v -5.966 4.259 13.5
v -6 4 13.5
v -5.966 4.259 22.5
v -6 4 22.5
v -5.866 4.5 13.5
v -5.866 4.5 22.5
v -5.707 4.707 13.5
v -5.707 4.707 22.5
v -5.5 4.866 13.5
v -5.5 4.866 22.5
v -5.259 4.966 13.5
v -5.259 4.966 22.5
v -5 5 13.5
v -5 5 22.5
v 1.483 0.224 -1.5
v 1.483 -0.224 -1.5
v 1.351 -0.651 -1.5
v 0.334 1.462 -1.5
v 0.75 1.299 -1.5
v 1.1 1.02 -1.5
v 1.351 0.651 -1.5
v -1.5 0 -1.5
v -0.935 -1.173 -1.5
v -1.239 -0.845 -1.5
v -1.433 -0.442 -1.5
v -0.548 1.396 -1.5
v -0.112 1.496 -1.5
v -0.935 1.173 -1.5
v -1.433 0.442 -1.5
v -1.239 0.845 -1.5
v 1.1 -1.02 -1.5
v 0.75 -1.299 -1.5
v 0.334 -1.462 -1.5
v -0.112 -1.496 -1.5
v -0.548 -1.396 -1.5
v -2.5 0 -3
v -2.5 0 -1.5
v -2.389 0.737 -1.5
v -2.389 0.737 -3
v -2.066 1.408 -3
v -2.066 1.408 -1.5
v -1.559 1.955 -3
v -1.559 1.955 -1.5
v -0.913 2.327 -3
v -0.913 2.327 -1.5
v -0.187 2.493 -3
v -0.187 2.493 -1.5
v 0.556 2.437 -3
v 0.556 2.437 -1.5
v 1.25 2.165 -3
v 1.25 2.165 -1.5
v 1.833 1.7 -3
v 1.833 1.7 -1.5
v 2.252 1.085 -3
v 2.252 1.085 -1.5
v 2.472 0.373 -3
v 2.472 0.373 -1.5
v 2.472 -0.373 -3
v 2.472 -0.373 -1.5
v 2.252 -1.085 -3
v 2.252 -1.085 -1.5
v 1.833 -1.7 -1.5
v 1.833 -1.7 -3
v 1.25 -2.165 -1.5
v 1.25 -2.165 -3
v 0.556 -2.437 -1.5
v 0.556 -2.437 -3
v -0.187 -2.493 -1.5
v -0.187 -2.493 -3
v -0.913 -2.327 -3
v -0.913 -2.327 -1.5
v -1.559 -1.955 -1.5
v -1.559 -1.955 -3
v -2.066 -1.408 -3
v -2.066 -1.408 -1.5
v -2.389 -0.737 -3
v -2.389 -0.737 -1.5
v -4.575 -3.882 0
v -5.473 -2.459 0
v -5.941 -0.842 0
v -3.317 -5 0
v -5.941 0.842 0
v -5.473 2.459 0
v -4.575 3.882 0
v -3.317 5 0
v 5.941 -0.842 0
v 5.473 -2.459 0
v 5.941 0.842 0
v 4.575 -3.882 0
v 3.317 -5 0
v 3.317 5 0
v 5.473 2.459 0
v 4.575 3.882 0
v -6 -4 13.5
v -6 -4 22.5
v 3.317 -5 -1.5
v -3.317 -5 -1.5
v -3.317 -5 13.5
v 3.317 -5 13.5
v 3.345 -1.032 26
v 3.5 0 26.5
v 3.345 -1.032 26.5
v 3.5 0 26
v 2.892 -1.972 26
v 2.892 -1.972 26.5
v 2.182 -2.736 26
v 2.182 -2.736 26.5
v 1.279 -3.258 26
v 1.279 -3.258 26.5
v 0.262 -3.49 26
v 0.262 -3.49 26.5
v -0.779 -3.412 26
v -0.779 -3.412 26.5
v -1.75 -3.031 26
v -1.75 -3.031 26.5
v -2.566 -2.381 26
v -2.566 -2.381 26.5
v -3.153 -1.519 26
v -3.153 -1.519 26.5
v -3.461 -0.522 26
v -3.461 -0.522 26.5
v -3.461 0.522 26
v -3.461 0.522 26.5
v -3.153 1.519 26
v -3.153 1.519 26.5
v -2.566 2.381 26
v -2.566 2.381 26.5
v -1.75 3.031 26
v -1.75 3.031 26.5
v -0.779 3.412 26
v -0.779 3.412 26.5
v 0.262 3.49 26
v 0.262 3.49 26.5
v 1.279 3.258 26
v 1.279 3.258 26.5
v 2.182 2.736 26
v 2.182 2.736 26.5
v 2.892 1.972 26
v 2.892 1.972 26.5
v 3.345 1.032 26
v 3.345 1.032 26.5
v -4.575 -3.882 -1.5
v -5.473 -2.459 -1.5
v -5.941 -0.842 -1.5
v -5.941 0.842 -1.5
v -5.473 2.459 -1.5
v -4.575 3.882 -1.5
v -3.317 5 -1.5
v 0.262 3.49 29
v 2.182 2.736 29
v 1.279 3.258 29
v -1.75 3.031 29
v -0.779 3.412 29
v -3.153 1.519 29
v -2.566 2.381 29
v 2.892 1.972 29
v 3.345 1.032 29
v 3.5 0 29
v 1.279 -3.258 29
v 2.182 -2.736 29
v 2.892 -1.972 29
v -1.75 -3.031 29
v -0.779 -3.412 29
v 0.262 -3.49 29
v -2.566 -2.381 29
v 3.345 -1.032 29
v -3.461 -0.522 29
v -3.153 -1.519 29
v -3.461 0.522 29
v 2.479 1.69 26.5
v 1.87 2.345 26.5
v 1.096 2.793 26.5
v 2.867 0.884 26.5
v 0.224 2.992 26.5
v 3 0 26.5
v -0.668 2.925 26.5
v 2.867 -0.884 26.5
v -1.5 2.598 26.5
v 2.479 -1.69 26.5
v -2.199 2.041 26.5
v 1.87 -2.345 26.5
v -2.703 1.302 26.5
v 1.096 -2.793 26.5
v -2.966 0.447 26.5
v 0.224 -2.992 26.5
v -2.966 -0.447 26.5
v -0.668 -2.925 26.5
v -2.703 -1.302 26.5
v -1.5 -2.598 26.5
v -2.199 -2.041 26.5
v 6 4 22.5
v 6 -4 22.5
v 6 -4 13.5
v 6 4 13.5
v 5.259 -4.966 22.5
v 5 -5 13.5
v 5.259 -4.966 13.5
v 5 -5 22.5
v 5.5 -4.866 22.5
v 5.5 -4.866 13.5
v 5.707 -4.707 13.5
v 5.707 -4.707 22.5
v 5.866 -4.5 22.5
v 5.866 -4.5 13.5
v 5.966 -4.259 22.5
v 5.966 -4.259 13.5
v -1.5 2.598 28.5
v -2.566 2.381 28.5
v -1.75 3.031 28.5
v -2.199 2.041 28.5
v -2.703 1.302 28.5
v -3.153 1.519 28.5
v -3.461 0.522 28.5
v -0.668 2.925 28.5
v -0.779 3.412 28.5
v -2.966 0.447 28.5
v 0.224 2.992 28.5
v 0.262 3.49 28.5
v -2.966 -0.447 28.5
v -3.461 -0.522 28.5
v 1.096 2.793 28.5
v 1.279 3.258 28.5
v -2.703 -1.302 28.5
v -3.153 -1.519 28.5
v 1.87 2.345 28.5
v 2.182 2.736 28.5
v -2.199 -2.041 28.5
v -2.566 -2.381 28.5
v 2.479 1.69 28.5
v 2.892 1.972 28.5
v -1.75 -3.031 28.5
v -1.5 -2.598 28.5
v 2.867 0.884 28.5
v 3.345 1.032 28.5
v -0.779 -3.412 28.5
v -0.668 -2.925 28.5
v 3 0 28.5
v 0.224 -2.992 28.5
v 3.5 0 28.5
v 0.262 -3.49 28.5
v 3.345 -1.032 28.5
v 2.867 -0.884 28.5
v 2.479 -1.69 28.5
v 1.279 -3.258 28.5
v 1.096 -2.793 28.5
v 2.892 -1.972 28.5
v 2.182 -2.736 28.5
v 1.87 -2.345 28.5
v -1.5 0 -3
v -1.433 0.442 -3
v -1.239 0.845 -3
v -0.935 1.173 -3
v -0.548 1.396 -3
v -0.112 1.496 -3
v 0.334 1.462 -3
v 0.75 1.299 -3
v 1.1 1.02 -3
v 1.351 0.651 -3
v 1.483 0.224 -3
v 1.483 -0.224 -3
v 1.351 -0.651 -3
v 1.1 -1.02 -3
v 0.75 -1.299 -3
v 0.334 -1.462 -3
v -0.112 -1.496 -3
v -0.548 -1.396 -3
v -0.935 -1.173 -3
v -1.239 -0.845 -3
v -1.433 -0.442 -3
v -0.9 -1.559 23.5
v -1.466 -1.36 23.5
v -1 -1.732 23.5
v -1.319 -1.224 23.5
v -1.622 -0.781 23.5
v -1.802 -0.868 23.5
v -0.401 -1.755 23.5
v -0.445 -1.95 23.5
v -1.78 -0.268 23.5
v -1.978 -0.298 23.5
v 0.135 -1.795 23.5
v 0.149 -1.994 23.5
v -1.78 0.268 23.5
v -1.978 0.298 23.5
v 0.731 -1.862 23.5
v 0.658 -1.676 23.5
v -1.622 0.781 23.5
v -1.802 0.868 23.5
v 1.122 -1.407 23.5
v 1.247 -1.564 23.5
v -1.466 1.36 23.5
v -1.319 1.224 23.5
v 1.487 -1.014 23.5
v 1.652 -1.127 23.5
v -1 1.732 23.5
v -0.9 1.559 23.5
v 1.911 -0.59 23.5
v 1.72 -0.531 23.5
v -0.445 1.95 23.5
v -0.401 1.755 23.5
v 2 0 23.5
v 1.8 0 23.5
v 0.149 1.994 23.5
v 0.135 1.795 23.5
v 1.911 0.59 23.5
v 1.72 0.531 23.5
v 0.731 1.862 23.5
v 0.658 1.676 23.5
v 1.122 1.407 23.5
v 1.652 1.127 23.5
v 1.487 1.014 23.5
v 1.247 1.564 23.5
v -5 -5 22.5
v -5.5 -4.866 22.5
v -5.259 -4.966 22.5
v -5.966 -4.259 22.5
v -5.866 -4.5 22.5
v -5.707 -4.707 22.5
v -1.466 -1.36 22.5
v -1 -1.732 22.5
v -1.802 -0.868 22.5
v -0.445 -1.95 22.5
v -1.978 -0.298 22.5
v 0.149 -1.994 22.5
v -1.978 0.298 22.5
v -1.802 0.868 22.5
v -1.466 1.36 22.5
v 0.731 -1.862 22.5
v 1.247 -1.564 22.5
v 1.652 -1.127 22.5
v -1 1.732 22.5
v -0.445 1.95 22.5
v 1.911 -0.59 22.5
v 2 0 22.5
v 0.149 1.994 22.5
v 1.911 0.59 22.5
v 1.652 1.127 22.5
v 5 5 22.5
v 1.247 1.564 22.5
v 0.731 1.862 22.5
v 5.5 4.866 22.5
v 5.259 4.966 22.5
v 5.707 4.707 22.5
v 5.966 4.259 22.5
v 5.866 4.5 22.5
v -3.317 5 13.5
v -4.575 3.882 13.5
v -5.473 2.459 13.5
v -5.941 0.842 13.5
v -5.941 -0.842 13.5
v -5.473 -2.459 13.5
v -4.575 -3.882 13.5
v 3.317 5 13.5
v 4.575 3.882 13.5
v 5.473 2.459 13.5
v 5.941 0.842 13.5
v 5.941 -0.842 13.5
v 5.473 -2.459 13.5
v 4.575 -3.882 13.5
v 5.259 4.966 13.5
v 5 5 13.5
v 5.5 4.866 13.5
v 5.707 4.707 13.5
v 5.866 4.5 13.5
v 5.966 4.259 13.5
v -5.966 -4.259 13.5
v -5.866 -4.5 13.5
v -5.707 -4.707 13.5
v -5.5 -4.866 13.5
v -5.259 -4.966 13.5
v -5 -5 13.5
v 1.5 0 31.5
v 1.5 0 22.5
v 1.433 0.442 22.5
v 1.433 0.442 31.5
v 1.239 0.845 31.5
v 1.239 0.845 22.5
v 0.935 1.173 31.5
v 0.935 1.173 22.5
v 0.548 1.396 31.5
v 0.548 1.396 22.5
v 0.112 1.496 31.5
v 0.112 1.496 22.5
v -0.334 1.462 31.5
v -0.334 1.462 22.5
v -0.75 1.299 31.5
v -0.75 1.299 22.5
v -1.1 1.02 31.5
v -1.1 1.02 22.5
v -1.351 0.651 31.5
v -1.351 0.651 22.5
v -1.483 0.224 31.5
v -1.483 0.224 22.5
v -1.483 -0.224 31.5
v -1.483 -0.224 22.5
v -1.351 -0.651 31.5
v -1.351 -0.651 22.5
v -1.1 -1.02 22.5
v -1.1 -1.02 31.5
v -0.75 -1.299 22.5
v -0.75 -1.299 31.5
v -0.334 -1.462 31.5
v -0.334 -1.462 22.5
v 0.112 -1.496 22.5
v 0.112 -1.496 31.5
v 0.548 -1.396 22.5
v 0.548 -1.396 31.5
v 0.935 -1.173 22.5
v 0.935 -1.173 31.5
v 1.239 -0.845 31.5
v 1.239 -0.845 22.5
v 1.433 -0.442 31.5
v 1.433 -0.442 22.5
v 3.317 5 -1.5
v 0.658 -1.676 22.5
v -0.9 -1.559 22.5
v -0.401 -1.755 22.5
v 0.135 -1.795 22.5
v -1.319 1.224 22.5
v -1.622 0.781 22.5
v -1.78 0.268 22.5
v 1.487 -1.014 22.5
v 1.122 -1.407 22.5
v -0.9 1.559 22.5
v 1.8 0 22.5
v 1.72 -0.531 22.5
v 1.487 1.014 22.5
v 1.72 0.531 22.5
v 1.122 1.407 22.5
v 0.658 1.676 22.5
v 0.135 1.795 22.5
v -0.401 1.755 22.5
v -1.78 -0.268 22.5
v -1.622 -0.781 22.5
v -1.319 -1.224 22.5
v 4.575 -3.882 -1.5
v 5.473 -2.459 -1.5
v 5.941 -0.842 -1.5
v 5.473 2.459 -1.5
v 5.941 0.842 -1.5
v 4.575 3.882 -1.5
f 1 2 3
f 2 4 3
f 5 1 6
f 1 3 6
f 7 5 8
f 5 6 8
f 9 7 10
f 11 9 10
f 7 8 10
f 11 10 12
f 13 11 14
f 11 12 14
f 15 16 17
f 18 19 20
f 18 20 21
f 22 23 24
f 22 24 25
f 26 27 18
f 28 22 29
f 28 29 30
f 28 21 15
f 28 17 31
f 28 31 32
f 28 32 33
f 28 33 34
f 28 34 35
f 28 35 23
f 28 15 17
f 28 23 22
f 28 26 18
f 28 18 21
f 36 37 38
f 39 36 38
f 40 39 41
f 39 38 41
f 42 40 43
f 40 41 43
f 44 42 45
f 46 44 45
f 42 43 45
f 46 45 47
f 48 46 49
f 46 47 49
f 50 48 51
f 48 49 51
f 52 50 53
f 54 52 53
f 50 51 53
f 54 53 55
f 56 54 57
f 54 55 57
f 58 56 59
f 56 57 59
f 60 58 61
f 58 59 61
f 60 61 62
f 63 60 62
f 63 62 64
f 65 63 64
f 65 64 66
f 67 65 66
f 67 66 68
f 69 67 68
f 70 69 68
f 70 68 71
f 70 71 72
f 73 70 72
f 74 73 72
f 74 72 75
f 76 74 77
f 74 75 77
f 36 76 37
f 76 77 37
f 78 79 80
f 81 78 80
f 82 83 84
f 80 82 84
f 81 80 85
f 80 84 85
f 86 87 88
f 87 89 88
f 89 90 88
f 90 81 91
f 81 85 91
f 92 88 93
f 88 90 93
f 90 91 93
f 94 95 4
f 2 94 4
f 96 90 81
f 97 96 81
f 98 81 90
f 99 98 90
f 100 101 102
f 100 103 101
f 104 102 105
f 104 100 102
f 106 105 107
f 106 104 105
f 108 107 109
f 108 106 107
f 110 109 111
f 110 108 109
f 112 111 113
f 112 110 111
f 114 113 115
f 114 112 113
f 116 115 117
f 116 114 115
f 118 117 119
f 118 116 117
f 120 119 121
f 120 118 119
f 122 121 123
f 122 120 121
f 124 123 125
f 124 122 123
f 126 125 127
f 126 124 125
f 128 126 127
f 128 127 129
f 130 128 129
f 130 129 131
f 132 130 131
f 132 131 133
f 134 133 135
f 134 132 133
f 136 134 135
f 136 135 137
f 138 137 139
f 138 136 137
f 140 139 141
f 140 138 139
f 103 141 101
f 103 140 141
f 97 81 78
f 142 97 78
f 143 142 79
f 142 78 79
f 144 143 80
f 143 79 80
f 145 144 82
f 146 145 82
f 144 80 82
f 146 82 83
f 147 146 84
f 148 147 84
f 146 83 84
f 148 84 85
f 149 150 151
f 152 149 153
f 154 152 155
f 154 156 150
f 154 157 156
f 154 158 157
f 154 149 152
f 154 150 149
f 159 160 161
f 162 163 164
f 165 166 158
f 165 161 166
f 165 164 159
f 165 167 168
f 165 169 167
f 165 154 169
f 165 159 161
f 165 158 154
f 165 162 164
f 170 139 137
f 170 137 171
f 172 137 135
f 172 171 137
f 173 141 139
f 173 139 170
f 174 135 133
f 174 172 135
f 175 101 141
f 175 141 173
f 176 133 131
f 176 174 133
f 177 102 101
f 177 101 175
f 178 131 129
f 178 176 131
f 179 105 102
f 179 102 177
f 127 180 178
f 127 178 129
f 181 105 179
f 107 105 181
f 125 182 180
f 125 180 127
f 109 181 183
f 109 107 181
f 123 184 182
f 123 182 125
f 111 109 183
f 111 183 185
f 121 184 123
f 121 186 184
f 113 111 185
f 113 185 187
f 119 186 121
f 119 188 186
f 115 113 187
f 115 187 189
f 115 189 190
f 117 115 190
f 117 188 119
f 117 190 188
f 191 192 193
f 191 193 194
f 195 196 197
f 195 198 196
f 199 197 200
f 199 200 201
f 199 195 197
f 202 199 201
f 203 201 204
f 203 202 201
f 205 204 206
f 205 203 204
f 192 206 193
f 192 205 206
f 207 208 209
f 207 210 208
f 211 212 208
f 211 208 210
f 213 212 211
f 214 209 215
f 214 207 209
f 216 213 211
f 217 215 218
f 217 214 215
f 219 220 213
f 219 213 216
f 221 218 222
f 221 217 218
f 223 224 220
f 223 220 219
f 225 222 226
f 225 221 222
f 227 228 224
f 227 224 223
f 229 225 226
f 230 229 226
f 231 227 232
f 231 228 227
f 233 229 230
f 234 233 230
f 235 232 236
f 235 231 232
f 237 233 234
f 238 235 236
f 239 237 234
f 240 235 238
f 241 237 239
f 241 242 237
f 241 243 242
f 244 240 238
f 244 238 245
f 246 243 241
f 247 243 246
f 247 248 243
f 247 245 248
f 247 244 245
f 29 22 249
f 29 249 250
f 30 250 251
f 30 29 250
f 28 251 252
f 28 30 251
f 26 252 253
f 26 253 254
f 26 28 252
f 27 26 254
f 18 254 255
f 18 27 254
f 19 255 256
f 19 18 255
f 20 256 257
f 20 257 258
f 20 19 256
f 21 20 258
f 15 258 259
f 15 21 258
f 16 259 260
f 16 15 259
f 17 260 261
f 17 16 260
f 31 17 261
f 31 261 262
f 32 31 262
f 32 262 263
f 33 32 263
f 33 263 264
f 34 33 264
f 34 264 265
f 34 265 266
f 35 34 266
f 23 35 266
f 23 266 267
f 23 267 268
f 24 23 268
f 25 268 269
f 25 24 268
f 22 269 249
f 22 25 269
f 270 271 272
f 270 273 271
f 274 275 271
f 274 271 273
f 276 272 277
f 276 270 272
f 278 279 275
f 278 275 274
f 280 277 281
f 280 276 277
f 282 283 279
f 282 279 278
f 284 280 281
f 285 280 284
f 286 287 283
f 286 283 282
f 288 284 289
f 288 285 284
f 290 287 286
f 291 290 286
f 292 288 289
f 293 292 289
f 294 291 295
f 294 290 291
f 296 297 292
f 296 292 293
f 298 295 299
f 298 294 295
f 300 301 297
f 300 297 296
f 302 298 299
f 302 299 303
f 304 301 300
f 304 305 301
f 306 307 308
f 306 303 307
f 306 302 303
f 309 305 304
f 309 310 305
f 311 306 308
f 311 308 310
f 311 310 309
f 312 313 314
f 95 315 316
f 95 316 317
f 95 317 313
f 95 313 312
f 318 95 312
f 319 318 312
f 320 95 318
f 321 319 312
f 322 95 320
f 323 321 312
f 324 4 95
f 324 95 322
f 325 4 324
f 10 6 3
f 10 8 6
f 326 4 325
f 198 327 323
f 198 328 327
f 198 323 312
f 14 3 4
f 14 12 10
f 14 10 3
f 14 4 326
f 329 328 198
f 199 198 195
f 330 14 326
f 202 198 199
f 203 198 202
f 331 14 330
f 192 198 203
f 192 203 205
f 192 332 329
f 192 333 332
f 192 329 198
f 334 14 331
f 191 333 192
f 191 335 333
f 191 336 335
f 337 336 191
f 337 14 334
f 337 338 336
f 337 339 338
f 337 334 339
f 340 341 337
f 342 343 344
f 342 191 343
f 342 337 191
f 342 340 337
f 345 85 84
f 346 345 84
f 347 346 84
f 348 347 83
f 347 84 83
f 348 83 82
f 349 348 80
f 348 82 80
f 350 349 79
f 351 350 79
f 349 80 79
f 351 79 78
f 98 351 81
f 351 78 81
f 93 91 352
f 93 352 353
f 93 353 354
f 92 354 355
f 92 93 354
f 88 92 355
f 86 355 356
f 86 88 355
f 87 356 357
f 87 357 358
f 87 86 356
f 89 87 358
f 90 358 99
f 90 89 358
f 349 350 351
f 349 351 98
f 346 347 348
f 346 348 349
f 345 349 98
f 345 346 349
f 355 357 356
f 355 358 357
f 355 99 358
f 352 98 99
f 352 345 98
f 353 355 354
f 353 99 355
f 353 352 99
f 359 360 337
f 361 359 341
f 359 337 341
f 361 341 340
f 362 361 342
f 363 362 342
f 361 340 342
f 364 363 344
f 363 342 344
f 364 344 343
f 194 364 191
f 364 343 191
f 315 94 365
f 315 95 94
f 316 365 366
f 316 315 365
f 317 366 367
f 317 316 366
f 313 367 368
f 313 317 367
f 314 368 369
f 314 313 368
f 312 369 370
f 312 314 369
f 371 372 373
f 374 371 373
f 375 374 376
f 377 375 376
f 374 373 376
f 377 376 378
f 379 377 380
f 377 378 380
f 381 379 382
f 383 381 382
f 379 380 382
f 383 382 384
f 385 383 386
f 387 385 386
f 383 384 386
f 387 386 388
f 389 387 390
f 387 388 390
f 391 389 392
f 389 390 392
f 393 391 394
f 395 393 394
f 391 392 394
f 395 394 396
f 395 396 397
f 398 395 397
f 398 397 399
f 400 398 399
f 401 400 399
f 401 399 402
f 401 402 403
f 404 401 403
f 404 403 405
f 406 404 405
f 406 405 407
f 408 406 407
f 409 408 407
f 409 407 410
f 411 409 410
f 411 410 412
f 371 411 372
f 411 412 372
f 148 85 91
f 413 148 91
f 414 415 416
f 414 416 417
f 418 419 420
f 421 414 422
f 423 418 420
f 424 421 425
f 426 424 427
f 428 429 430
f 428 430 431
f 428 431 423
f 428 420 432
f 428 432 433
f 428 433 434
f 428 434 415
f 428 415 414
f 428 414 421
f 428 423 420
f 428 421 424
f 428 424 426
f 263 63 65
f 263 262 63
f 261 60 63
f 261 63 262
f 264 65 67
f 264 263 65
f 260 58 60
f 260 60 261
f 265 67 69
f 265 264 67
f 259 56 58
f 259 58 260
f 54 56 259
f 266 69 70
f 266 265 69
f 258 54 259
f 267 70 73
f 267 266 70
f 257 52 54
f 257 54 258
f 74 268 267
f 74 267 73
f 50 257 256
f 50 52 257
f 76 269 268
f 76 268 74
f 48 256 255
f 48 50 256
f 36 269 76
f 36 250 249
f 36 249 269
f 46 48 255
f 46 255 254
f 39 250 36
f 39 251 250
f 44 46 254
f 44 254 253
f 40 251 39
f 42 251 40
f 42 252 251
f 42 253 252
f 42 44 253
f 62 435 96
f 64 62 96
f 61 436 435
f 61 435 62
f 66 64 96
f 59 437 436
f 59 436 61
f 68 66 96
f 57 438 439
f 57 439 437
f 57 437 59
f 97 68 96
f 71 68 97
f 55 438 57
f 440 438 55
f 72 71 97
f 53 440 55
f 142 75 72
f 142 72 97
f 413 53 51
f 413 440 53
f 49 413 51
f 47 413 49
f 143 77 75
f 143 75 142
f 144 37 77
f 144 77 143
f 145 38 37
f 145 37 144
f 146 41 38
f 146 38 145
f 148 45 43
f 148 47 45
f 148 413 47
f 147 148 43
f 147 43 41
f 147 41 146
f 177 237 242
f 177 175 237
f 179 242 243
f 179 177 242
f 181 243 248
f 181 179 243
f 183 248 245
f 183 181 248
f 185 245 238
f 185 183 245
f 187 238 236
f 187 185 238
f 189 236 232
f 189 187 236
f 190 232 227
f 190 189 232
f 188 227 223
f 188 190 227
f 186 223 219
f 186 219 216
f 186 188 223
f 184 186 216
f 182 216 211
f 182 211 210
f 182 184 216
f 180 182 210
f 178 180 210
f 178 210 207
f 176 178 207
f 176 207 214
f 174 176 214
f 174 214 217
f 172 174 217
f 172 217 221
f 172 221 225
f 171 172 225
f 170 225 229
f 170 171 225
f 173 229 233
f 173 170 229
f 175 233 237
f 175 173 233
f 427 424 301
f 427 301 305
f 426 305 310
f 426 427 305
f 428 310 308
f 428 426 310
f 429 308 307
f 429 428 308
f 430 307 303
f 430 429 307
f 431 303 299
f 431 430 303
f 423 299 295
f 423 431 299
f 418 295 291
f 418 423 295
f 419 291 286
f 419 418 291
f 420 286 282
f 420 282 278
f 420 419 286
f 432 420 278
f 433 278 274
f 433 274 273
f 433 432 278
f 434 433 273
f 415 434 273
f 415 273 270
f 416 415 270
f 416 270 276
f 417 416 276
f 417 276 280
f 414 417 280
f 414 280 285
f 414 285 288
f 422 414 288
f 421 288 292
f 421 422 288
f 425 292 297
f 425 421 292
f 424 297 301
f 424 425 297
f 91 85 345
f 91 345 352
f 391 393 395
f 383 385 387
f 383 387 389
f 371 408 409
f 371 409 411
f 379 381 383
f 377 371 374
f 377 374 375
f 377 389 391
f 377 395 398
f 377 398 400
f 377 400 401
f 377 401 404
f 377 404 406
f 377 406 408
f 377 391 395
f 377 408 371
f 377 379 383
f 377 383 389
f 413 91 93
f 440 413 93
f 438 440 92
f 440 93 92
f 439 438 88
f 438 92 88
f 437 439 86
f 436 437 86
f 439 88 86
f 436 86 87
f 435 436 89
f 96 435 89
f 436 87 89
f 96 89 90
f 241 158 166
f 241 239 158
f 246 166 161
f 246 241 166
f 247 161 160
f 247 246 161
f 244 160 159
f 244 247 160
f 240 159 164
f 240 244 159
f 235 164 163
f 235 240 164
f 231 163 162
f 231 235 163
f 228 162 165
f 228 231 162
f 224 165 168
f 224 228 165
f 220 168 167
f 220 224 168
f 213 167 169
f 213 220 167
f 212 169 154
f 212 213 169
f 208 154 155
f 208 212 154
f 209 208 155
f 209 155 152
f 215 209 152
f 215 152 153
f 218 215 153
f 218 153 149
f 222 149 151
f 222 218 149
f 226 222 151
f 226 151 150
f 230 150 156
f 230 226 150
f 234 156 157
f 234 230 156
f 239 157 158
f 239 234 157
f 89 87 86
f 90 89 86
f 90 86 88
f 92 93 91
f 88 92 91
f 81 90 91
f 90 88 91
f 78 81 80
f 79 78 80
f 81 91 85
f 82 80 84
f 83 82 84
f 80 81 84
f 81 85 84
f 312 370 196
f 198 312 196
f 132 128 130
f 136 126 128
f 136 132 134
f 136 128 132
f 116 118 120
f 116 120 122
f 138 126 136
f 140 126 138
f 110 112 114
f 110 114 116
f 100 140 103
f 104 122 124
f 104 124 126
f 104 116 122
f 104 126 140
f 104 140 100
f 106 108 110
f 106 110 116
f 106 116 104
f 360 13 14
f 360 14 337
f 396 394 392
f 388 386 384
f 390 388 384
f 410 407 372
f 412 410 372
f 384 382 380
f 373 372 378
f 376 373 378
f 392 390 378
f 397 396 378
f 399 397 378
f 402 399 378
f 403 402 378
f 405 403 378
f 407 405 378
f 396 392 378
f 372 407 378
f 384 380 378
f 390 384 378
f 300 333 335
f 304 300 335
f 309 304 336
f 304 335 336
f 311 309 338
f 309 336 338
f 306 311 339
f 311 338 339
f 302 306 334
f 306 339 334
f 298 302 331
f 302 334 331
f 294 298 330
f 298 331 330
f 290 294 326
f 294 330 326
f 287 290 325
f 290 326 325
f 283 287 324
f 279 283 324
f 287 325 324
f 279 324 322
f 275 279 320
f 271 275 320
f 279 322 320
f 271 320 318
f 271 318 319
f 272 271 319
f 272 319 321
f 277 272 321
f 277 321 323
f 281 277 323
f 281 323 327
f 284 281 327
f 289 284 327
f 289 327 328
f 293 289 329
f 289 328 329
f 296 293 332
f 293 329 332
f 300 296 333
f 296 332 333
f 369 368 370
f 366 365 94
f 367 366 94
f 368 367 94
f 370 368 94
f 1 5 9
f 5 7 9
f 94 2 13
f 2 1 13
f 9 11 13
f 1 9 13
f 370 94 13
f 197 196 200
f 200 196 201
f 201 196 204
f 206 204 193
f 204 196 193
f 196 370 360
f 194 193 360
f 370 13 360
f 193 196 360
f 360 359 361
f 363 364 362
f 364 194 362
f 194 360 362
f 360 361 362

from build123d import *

# Parameters (mm, degrees)
SKETCH1_W           = 6.63324958
SKETCH1_H           = 10
BOSS_EXTRUDE1_DEPTH = 13.5
SKETCH2_W           = 12
SKETCH2_H           = 10
BOSS_EXTRUDE3_DEPTH = 9
SKETCH4_R           = 2
SKETCH4_R_2         = 1.8
BOSS_EXTRUDE4_DEPTH = 1
SKETCH5_R           = 1.5
BOSS_EXTRUDE5_DEPTH = 9
BOSS_EXTRUDE6_DEPTH = 1.5
SKETCH7_R           = 2.5
SKETCH7_R_2         = 1.5
BOSS_EXTRUDE7_DEPTH = 1.5
FILLET1_R           = 1


with BuildPart() as part:
    # Sketch1 → Boss-Extrude1 (new body)
    with BuildSketch(Plane.XY):
        with BuildLine():
            Line((-3.31662479, -5), (-3.31662479, 5))
            ThreePointArc((-3.31662479, 5), (-6, 0), (-3.31662479, -5))
        make_face()
        with BuildLine():
            Line((3.31662479, -5), (3.31662479, 5))
            ThreePointArc((3.31662479, 5), (6, 0), (3.31662479, -5))
        make_face()
        Rectangle(SKETCH1_W, SKETCH1_H)
    extrude(amount=BOSS_EXTRUDE1_DEPTH)


with BuildPart() as body_2:
    # Sketch2 → Boss-Extrude3 (new body)
    with BuildSketch(Plane.XY.offset(13.5)):
        Rectangle(SKETCH2_W, SKETCH2_H)
    extrude(amount=BOSS_EXTRUDE3_DEPTH)

    # Sketch4 → Boss-Extrude4 (add)
    with BuildSketch(Plane.XY.offset(22.5)):
        Circle(SKETCH4_R)
        Circle(SKETCH4_R_2, mode=Mode.SUBTRACT)
    extrude(amount=BOSS_EXTRUDE4_DEPTH)

    # Fillet1
    fillet1_edges = [body_2.edges().sort_by_distance(p)[0] for p in [
        (-6, 5, 18),
        (6, 5, 18),
        (6, -5, 18),
        (-6, -5, 18),
    ]]
    fillet(fillet1_edges, radius=FILLET1_R)


with BuildPart() as body_3:
    # Sketch5 → Boss-Extrude5 (new body)
    with BuildSketch(Plane.XY.offset(22.5)):
        Circle(SKETCH5_R)
    extrude(amount=BOSS_EXTRUDE5_DEPTH)


with BuildPart() as body_4:
    # Sketch6 → Boss-Extrude6 (new body)
    with BuildSketch(Plane(origin=(0, 0, 0), x_dir=(-1, 0, 0), z_dir=(0, 0, -1))):
        with BuildLine():
            Line((3.31662479, 5), (-3.31662479, 5))
            ThreePointArc((-3.31662479, 5), (-6, 0), (-3.31662479, -5))
            Line((-3.31662479, -5), (3.31662479, -5))
            ThreePointArc((3.31662479, -5), (6, 0), (3.31662479, 5))
        make_face()
    extrude(amount=BOSS_EXTRUDE6_DEPTH)

    # Sketch7 → Boss-Extrude7 (add)
    with BuildSketch(Plane(origin=(0, 0, -1.5), x_dir=(-1, 0, 0), z_dir=(0, 0, -1))):
        Circle(SKETCH7_R)
        Circle(SKETCH7_R_2, mode=Mode.SUBTRACT)
    extrude(amount=BOSS_EXTRUDE7_DEPTH)


with BuildPart() as body_5:
    # Sketch8 → Revolve1 (revolve)
    with BuildSketch(Plane(origin=(0, 0, 0), x_dir=(1, 0, 0), z_dir=(0, 1, 0))):
        Polygon((0, -29), (3.5, -29), (3.5, -28.5), (3, -28.5), (3, -26.5), (3.5, -26.5), (3.5, -26), (0, -26), align=None)
    revolve(axis=Axis((0, 0, 31.5), (0, 0, -1)))


solid = Compound([part.part, body_2.part, body_3.part, body_4.part, body_5.part])
